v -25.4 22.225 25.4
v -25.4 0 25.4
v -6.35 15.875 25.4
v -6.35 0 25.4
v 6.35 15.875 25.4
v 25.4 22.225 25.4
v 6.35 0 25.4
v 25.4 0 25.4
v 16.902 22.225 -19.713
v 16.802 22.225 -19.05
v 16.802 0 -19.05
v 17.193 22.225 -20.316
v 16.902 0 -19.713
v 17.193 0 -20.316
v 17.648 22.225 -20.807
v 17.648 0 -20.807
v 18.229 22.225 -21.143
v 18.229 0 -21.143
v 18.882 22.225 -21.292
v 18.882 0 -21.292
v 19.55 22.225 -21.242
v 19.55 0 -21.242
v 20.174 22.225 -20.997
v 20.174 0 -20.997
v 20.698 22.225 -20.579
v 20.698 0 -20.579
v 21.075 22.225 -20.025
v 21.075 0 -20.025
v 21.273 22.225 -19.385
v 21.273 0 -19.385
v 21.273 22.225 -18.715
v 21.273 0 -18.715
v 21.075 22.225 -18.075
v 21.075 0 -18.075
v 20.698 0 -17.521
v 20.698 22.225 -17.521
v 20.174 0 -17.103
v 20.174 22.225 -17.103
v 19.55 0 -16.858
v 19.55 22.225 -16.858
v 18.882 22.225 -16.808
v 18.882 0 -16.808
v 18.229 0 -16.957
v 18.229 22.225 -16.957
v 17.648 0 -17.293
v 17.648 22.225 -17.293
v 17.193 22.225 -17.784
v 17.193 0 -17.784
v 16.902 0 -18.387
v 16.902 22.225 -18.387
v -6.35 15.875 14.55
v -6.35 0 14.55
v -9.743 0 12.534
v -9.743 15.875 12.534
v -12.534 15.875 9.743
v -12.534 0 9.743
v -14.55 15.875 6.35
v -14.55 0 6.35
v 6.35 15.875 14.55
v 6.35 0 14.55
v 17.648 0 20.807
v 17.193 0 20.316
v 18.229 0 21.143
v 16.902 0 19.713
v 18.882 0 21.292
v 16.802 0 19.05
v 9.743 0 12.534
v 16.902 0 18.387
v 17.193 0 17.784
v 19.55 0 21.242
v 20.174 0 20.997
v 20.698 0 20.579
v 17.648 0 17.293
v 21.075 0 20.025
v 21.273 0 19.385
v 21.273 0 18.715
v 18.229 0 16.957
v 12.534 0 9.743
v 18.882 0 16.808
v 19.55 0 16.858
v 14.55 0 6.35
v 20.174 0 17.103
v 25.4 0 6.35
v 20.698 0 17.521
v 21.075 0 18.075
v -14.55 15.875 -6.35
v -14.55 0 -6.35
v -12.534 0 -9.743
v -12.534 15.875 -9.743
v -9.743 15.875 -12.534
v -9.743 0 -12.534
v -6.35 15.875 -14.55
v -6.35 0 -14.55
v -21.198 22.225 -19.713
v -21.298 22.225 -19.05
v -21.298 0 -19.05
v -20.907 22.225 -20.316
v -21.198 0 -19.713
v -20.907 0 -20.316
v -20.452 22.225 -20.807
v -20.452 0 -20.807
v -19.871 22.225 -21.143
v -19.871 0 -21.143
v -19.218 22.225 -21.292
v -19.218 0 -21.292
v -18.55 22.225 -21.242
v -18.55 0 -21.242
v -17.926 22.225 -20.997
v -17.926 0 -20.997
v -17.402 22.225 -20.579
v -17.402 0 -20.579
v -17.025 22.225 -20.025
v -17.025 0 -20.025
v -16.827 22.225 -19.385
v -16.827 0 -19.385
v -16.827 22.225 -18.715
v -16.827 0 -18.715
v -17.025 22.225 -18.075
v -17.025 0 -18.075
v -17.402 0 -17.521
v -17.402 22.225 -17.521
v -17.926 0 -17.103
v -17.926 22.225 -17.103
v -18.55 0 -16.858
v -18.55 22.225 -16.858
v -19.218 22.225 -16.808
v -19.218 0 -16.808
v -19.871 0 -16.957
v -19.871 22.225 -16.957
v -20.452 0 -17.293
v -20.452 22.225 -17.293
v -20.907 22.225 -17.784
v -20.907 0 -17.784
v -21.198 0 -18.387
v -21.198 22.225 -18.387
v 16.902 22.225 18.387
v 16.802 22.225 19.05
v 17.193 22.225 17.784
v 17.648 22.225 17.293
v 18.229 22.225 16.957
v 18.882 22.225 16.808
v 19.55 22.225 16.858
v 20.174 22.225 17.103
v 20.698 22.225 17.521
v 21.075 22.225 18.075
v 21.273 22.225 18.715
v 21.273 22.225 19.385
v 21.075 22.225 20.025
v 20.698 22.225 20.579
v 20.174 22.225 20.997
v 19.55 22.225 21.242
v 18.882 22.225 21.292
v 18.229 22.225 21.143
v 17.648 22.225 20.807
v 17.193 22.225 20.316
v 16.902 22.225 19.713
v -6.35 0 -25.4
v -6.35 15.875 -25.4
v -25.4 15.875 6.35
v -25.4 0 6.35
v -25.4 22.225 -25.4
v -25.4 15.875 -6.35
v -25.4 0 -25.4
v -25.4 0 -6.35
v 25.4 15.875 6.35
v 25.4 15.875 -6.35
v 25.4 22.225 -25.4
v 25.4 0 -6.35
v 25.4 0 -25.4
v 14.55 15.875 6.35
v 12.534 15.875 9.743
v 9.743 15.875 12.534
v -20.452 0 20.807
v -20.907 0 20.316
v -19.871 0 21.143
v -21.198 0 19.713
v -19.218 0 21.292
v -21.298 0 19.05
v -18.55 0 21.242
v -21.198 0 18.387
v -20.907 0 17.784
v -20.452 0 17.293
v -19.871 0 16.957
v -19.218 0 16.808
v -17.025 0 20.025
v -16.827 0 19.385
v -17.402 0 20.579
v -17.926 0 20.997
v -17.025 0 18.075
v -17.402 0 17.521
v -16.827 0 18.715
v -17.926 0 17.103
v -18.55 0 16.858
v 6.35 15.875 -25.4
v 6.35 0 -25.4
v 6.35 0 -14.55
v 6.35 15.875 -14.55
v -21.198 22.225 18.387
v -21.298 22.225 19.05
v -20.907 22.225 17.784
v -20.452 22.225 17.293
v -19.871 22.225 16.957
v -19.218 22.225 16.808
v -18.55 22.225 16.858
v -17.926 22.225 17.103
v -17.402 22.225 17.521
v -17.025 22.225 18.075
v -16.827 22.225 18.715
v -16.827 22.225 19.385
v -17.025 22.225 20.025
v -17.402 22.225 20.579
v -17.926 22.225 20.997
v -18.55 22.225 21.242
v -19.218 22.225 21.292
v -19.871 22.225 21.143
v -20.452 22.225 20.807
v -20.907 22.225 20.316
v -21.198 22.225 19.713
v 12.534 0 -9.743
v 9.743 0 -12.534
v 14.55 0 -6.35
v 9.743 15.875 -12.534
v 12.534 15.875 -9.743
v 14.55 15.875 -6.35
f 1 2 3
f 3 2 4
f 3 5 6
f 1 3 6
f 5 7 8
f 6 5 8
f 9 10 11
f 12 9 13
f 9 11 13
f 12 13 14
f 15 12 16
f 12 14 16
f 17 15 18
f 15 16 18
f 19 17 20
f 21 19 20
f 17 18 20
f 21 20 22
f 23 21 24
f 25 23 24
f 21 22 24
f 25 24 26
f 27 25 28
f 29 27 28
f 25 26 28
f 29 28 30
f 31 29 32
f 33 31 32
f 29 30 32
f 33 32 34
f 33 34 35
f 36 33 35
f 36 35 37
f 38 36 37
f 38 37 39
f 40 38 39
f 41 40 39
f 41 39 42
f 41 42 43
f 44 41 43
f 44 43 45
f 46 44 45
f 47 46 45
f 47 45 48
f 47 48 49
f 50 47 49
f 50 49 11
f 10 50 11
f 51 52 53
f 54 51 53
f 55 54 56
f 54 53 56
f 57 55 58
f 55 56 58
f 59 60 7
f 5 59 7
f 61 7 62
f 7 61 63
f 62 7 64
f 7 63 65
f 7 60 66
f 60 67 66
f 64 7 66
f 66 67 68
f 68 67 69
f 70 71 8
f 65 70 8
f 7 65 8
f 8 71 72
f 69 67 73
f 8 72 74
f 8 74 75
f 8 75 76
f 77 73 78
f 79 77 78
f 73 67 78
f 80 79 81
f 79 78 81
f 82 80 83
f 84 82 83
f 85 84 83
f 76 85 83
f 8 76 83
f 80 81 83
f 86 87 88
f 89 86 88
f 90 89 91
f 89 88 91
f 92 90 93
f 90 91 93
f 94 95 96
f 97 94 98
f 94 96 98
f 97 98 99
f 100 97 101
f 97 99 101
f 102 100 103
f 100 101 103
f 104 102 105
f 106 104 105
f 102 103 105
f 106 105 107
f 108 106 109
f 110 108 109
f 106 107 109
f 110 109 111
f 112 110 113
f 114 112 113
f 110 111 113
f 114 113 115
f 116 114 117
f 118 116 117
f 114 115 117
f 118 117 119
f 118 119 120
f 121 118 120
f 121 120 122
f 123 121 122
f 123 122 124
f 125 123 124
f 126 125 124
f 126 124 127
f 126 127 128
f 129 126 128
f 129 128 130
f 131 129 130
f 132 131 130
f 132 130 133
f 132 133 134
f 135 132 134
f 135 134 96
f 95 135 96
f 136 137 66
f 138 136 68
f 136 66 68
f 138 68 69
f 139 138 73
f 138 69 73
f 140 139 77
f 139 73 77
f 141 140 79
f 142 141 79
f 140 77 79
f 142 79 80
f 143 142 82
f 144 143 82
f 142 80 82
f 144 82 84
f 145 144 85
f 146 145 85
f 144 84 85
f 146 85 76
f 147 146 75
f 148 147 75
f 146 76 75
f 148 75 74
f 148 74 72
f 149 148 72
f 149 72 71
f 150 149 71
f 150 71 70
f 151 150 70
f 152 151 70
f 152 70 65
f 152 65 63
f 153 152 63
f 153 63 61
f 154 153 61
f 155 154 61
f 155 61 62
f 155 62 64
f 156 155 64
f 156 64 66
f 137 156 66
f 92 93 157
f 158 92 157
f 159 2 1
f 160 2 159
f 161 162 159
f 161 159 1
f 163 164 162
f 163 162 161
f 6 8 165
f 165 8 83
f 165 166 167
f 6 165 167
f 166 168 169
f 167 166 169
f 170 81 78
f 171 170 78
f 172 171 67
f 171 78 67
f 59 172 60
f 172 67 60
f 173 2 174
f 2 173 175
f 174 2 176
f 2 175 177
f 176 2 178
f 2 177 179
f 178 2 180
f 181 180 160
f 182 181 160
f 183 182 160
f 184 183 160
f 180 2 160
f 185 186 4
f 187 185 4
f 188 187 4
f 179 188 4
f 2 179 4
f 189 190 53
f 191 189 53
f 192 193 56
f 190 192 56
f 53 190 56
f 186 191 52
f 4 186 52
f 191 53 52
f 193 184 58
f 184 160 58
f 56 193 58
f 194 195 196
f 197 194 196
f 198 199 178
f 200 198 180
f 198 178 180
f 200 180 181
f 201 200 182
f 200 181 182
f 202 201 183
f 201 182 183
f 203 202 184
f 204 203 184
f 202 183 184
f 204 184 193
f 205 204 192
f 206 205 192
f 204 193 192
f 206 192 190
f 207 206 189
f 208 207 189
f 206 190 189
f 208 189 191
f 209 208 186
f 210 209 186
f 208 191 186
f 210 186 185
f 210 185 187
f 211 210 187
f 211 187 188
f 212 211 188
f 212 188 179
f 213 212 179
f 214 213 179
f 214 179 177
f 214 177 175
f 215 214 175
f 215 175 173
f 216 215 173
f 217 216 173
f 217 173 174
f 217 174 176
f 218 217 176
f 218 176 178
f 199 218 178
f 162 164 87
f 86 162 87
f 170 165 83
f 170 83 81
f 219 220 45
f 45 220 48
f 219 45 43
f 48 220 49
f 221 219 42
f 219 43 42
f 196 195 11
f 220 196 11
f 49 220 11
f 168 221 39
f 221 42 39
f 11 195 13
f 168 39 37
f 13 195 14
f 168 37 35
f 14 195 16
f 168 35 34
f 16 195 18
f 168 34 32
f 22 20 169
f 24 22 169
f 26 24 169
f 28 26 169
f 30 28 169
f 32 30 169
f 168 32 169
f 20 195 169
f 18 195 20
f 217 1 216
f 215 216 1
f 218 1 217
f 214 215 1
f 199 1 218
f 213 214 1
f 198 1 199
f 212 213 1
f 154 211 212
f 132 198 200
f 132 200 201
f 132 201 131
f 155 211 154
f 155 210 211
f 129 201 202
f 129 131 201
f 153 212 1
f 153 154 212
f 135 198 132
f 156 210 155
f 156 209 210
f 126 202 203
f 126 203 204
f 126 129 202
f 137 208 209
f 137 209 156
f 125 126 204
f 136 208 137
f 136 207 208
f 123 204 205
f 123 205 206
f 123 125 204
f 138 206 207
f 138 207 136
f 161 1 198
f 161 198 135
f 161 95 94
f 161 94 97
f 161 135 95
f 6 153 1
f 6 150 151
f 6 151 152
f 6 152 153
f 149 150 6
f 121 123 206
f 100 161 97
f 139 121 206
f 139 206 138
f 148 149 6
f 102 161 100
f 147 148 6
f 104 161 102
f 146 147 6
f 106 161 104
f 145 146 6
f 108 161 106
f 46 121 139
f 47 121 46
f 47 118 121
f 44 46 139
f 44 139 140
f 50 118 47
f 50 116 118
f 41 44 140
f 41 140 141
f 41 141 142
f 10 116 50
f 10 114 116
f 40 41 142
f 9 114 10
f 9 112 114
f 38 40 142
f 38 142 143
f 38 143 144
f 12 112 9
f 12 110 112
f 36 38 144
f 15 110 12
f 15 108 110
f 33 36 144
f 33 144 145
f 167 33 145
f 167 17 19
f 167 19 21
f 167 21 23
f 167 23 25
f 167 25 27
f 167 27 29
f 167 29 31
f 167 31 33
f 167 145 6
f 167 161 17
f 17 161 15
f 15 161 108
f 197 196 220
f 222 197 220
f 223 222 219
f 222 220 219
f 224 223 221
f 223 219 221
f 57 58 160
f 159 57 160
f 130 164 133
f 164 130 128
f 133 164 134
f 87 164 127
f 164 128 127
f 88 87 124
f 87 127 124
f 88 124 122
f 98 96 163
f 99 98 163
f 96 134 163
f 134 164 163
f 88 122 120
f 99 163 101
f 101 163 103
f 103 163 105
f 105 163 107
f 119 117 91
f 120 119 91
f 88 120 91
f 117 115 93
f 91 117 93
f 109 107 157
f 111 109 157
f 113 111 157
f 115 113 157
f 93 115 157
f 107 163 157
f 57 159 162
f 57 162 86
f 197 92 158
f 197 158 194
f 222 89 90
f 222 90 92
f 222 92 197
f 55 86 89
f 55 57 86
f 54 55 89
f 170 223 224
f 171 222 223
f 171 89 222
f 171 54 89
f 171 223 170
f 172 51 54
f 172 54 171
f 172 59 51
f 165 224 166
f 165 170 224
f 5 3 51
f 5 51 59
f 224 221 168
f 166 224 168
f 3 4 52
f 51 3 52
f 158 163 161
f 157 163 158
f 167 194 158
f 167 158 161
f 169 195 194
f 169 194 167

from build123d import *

# Parameters (mm, degrees)
SKETCH1_W             = 50.8
SKETCH1_H             = 50.8
BOSS_EXTRUDE1_DEPTH   = 22.225
F_8_CLEARANCE_HOLE1_D = 4.4958
SKETCH9_W             = 12.7
SKETCH9_H             = 12.7
CUT_EXTRUDE1_DEPTH    = 15.875


with BuildPart() as part:
    # Sketch1 → Boss-Extrude1 (new body)
    with BuildSketch(Plane(origin=(0, 0, 0), x_dir=(1, 0, 0), z_dir=(0, 1, 0))):
        Rectangle(SKETCH1_W, SKETCH1_H)
    extrude(amount=BOSS_EXTRUDE1_DEPTH)

    # #8 Clearance Hole1 (through all)
    with Locations(Plane(origin=(0, 22.225, 0), x_dir=(1, 0, 0), z_dir=(0, 1, 0))):
        with Locations((-19.05, 19.05), (19.05, 19.05), (19.05, -19.05), (-19.05, -19.05)):
            Hole(F_8_CLEARANCE_HOLE1_D / 2)

    # Sketch9 → Cut-Extrude1 (cut)
    with BuildSketch(Plane.XZ):
        with BuildLine():
            ThreePointArc((-6.35, 14.549677831), (-11.225320151, 11.225320151), (-14.549677831, 6.35))
            Line((-14.549677831, 6.35), (-6.35, 6.35))
            Line((-6.35, 6.35), (-6.35, 14.549677831))
        make_face()
        with BuildLine():
            Line((-6.35, 25.4), (-6.35, 14.549677831))
            ThreePointArc((-6.35, 14.549677831), (0, 15.875), (6.35, 14.549677831))
            Line((6.35, 14.549677831), (6.35, 25.4))
            Line((6.35, 25.4), (-6.35, 25.4))
        make_face()
        with BuildLine():
            Line((6.35, 14.549677831), (6.35, 6.35))
            Line((6.35, 6.35), (14.549677831, 6.35))
            ThreePointArc((14.549677831, 6.35), (11.225320151, 11.225320151), (6.35, 14.549677831))
        make_face()
        with BuildLine():
            Line((25.4, 6.35), (14.549677831, 6.35))
            ThreePointArc((14.549677831, 6.35), (15.540137718, 3.243415594), (15.875, 0))
            ThreePointArc((15.875, 0), (15.540137718, -3.243415594), (14.549677831, -6.35))
            Line((14.549677831, -6.35), (25.4, -6.35))
            Line((25.4, -6.35), (25.4, 6.35))
        make_face()
        with BuildLine():
            Line((14.549677831, -6.35), (6.35, -6.35))
            Line((6.35, -6.35), (6.35, -14.549677831))
            ThreePointArc((6.35, -14.549677831), (11.225320151, -11.225320151), (14.549677831, -6.35))
        make_face()
        with BuildLine():
            ThreePointArc((6.35, -14.549677831), (0, -15.875), (-6.35, -14.549677831))
            Line((-6.35, -14.549677831), (-6.35, -25.4))
            Line((-6.35, -25.4), (6.35, -25.4))
            Line((6.35, -25.4), (6.35, -14.549677831))
        make_face()
        with BuildLine():
            Line((-6.35, -6.35), (-14.549677831, -6.35))
            ThreePointArc((-14.549677831, -6.35), (-11.225320151, -11.225320151), (-6.35, -14.549677831))
            Line((-6.35, -14.549677831), (-6.35, -6.35))
        make_face()
        with BuildLine():
            Line((-14.549677831, 6.35), (-25.4, 6.35))
            Line((-25.4, 6.35), (-25.4, -6.35))
            Line((-25.4, -6.35), (-14.549677831, -6.35))
            ThreePointArc((-14.549677831, -6.35), (-15.875, 0), (-14.549677831, 6.35))
        make_face()
        with BuildLine():
            Line((-6.35, 6.35), (-14.549677831, 6.35))
            ThreePointArc((-14.549677831, 6.35), (-15.875, 0), (-14.549677831, -6.35))
            Line((-14.549677831, -6.35), (-6.35, -6.35))
            Line((-6.35, -6.35), (-6.35, 6.35))
        make_face()
        with BuildLine():
            Line((6.35, -6.35), (-6.35, -6.35))
            Line((-6.35, -6.35), (-6.35, -14.549677831))
            ThreePointArc((-6.35, -14.549677831), (0, -15.875), (6.35, -14.549677831))
            Line((6.35, -14.549677831), (6.35, -6.35))
        make_face()
        with BuildLine():
            Line((14.549677831, 6.35), (6.35, 6.35))
            Line((6.35, 6.35), (6.35, -6.35))
            Line((6.35, -6.35), (14.549677831, -6.35))
            ThreePointArc((14.549677831, -6.35), (15.540137718, -3.243415594), (15.875, 0))
            ThreePointArc((15.875, 0), (15.540137718, 3.243415594), (14.549677831, 6.35))
        make_face()
        Rectangle(SKETCH9_W, SKETCH9_H)
        with BuildLine():
            Line((-6.35, 14.549677831), (-6.35, 6.35))
            Line((-6.35, 6.35), (6.35, 6.35))
            Line((6.35, 6.35), (6.35, 14.549677831))
            ThreePointArc((6.35, 14.549677831), (0, 15.875), (-6.35, 14.549677831))
        make_face()
    extrude(amount=-CUT_EXTRUDE1_DEPTH, mode=Mode.SUBTRACT)


solid = part.part
